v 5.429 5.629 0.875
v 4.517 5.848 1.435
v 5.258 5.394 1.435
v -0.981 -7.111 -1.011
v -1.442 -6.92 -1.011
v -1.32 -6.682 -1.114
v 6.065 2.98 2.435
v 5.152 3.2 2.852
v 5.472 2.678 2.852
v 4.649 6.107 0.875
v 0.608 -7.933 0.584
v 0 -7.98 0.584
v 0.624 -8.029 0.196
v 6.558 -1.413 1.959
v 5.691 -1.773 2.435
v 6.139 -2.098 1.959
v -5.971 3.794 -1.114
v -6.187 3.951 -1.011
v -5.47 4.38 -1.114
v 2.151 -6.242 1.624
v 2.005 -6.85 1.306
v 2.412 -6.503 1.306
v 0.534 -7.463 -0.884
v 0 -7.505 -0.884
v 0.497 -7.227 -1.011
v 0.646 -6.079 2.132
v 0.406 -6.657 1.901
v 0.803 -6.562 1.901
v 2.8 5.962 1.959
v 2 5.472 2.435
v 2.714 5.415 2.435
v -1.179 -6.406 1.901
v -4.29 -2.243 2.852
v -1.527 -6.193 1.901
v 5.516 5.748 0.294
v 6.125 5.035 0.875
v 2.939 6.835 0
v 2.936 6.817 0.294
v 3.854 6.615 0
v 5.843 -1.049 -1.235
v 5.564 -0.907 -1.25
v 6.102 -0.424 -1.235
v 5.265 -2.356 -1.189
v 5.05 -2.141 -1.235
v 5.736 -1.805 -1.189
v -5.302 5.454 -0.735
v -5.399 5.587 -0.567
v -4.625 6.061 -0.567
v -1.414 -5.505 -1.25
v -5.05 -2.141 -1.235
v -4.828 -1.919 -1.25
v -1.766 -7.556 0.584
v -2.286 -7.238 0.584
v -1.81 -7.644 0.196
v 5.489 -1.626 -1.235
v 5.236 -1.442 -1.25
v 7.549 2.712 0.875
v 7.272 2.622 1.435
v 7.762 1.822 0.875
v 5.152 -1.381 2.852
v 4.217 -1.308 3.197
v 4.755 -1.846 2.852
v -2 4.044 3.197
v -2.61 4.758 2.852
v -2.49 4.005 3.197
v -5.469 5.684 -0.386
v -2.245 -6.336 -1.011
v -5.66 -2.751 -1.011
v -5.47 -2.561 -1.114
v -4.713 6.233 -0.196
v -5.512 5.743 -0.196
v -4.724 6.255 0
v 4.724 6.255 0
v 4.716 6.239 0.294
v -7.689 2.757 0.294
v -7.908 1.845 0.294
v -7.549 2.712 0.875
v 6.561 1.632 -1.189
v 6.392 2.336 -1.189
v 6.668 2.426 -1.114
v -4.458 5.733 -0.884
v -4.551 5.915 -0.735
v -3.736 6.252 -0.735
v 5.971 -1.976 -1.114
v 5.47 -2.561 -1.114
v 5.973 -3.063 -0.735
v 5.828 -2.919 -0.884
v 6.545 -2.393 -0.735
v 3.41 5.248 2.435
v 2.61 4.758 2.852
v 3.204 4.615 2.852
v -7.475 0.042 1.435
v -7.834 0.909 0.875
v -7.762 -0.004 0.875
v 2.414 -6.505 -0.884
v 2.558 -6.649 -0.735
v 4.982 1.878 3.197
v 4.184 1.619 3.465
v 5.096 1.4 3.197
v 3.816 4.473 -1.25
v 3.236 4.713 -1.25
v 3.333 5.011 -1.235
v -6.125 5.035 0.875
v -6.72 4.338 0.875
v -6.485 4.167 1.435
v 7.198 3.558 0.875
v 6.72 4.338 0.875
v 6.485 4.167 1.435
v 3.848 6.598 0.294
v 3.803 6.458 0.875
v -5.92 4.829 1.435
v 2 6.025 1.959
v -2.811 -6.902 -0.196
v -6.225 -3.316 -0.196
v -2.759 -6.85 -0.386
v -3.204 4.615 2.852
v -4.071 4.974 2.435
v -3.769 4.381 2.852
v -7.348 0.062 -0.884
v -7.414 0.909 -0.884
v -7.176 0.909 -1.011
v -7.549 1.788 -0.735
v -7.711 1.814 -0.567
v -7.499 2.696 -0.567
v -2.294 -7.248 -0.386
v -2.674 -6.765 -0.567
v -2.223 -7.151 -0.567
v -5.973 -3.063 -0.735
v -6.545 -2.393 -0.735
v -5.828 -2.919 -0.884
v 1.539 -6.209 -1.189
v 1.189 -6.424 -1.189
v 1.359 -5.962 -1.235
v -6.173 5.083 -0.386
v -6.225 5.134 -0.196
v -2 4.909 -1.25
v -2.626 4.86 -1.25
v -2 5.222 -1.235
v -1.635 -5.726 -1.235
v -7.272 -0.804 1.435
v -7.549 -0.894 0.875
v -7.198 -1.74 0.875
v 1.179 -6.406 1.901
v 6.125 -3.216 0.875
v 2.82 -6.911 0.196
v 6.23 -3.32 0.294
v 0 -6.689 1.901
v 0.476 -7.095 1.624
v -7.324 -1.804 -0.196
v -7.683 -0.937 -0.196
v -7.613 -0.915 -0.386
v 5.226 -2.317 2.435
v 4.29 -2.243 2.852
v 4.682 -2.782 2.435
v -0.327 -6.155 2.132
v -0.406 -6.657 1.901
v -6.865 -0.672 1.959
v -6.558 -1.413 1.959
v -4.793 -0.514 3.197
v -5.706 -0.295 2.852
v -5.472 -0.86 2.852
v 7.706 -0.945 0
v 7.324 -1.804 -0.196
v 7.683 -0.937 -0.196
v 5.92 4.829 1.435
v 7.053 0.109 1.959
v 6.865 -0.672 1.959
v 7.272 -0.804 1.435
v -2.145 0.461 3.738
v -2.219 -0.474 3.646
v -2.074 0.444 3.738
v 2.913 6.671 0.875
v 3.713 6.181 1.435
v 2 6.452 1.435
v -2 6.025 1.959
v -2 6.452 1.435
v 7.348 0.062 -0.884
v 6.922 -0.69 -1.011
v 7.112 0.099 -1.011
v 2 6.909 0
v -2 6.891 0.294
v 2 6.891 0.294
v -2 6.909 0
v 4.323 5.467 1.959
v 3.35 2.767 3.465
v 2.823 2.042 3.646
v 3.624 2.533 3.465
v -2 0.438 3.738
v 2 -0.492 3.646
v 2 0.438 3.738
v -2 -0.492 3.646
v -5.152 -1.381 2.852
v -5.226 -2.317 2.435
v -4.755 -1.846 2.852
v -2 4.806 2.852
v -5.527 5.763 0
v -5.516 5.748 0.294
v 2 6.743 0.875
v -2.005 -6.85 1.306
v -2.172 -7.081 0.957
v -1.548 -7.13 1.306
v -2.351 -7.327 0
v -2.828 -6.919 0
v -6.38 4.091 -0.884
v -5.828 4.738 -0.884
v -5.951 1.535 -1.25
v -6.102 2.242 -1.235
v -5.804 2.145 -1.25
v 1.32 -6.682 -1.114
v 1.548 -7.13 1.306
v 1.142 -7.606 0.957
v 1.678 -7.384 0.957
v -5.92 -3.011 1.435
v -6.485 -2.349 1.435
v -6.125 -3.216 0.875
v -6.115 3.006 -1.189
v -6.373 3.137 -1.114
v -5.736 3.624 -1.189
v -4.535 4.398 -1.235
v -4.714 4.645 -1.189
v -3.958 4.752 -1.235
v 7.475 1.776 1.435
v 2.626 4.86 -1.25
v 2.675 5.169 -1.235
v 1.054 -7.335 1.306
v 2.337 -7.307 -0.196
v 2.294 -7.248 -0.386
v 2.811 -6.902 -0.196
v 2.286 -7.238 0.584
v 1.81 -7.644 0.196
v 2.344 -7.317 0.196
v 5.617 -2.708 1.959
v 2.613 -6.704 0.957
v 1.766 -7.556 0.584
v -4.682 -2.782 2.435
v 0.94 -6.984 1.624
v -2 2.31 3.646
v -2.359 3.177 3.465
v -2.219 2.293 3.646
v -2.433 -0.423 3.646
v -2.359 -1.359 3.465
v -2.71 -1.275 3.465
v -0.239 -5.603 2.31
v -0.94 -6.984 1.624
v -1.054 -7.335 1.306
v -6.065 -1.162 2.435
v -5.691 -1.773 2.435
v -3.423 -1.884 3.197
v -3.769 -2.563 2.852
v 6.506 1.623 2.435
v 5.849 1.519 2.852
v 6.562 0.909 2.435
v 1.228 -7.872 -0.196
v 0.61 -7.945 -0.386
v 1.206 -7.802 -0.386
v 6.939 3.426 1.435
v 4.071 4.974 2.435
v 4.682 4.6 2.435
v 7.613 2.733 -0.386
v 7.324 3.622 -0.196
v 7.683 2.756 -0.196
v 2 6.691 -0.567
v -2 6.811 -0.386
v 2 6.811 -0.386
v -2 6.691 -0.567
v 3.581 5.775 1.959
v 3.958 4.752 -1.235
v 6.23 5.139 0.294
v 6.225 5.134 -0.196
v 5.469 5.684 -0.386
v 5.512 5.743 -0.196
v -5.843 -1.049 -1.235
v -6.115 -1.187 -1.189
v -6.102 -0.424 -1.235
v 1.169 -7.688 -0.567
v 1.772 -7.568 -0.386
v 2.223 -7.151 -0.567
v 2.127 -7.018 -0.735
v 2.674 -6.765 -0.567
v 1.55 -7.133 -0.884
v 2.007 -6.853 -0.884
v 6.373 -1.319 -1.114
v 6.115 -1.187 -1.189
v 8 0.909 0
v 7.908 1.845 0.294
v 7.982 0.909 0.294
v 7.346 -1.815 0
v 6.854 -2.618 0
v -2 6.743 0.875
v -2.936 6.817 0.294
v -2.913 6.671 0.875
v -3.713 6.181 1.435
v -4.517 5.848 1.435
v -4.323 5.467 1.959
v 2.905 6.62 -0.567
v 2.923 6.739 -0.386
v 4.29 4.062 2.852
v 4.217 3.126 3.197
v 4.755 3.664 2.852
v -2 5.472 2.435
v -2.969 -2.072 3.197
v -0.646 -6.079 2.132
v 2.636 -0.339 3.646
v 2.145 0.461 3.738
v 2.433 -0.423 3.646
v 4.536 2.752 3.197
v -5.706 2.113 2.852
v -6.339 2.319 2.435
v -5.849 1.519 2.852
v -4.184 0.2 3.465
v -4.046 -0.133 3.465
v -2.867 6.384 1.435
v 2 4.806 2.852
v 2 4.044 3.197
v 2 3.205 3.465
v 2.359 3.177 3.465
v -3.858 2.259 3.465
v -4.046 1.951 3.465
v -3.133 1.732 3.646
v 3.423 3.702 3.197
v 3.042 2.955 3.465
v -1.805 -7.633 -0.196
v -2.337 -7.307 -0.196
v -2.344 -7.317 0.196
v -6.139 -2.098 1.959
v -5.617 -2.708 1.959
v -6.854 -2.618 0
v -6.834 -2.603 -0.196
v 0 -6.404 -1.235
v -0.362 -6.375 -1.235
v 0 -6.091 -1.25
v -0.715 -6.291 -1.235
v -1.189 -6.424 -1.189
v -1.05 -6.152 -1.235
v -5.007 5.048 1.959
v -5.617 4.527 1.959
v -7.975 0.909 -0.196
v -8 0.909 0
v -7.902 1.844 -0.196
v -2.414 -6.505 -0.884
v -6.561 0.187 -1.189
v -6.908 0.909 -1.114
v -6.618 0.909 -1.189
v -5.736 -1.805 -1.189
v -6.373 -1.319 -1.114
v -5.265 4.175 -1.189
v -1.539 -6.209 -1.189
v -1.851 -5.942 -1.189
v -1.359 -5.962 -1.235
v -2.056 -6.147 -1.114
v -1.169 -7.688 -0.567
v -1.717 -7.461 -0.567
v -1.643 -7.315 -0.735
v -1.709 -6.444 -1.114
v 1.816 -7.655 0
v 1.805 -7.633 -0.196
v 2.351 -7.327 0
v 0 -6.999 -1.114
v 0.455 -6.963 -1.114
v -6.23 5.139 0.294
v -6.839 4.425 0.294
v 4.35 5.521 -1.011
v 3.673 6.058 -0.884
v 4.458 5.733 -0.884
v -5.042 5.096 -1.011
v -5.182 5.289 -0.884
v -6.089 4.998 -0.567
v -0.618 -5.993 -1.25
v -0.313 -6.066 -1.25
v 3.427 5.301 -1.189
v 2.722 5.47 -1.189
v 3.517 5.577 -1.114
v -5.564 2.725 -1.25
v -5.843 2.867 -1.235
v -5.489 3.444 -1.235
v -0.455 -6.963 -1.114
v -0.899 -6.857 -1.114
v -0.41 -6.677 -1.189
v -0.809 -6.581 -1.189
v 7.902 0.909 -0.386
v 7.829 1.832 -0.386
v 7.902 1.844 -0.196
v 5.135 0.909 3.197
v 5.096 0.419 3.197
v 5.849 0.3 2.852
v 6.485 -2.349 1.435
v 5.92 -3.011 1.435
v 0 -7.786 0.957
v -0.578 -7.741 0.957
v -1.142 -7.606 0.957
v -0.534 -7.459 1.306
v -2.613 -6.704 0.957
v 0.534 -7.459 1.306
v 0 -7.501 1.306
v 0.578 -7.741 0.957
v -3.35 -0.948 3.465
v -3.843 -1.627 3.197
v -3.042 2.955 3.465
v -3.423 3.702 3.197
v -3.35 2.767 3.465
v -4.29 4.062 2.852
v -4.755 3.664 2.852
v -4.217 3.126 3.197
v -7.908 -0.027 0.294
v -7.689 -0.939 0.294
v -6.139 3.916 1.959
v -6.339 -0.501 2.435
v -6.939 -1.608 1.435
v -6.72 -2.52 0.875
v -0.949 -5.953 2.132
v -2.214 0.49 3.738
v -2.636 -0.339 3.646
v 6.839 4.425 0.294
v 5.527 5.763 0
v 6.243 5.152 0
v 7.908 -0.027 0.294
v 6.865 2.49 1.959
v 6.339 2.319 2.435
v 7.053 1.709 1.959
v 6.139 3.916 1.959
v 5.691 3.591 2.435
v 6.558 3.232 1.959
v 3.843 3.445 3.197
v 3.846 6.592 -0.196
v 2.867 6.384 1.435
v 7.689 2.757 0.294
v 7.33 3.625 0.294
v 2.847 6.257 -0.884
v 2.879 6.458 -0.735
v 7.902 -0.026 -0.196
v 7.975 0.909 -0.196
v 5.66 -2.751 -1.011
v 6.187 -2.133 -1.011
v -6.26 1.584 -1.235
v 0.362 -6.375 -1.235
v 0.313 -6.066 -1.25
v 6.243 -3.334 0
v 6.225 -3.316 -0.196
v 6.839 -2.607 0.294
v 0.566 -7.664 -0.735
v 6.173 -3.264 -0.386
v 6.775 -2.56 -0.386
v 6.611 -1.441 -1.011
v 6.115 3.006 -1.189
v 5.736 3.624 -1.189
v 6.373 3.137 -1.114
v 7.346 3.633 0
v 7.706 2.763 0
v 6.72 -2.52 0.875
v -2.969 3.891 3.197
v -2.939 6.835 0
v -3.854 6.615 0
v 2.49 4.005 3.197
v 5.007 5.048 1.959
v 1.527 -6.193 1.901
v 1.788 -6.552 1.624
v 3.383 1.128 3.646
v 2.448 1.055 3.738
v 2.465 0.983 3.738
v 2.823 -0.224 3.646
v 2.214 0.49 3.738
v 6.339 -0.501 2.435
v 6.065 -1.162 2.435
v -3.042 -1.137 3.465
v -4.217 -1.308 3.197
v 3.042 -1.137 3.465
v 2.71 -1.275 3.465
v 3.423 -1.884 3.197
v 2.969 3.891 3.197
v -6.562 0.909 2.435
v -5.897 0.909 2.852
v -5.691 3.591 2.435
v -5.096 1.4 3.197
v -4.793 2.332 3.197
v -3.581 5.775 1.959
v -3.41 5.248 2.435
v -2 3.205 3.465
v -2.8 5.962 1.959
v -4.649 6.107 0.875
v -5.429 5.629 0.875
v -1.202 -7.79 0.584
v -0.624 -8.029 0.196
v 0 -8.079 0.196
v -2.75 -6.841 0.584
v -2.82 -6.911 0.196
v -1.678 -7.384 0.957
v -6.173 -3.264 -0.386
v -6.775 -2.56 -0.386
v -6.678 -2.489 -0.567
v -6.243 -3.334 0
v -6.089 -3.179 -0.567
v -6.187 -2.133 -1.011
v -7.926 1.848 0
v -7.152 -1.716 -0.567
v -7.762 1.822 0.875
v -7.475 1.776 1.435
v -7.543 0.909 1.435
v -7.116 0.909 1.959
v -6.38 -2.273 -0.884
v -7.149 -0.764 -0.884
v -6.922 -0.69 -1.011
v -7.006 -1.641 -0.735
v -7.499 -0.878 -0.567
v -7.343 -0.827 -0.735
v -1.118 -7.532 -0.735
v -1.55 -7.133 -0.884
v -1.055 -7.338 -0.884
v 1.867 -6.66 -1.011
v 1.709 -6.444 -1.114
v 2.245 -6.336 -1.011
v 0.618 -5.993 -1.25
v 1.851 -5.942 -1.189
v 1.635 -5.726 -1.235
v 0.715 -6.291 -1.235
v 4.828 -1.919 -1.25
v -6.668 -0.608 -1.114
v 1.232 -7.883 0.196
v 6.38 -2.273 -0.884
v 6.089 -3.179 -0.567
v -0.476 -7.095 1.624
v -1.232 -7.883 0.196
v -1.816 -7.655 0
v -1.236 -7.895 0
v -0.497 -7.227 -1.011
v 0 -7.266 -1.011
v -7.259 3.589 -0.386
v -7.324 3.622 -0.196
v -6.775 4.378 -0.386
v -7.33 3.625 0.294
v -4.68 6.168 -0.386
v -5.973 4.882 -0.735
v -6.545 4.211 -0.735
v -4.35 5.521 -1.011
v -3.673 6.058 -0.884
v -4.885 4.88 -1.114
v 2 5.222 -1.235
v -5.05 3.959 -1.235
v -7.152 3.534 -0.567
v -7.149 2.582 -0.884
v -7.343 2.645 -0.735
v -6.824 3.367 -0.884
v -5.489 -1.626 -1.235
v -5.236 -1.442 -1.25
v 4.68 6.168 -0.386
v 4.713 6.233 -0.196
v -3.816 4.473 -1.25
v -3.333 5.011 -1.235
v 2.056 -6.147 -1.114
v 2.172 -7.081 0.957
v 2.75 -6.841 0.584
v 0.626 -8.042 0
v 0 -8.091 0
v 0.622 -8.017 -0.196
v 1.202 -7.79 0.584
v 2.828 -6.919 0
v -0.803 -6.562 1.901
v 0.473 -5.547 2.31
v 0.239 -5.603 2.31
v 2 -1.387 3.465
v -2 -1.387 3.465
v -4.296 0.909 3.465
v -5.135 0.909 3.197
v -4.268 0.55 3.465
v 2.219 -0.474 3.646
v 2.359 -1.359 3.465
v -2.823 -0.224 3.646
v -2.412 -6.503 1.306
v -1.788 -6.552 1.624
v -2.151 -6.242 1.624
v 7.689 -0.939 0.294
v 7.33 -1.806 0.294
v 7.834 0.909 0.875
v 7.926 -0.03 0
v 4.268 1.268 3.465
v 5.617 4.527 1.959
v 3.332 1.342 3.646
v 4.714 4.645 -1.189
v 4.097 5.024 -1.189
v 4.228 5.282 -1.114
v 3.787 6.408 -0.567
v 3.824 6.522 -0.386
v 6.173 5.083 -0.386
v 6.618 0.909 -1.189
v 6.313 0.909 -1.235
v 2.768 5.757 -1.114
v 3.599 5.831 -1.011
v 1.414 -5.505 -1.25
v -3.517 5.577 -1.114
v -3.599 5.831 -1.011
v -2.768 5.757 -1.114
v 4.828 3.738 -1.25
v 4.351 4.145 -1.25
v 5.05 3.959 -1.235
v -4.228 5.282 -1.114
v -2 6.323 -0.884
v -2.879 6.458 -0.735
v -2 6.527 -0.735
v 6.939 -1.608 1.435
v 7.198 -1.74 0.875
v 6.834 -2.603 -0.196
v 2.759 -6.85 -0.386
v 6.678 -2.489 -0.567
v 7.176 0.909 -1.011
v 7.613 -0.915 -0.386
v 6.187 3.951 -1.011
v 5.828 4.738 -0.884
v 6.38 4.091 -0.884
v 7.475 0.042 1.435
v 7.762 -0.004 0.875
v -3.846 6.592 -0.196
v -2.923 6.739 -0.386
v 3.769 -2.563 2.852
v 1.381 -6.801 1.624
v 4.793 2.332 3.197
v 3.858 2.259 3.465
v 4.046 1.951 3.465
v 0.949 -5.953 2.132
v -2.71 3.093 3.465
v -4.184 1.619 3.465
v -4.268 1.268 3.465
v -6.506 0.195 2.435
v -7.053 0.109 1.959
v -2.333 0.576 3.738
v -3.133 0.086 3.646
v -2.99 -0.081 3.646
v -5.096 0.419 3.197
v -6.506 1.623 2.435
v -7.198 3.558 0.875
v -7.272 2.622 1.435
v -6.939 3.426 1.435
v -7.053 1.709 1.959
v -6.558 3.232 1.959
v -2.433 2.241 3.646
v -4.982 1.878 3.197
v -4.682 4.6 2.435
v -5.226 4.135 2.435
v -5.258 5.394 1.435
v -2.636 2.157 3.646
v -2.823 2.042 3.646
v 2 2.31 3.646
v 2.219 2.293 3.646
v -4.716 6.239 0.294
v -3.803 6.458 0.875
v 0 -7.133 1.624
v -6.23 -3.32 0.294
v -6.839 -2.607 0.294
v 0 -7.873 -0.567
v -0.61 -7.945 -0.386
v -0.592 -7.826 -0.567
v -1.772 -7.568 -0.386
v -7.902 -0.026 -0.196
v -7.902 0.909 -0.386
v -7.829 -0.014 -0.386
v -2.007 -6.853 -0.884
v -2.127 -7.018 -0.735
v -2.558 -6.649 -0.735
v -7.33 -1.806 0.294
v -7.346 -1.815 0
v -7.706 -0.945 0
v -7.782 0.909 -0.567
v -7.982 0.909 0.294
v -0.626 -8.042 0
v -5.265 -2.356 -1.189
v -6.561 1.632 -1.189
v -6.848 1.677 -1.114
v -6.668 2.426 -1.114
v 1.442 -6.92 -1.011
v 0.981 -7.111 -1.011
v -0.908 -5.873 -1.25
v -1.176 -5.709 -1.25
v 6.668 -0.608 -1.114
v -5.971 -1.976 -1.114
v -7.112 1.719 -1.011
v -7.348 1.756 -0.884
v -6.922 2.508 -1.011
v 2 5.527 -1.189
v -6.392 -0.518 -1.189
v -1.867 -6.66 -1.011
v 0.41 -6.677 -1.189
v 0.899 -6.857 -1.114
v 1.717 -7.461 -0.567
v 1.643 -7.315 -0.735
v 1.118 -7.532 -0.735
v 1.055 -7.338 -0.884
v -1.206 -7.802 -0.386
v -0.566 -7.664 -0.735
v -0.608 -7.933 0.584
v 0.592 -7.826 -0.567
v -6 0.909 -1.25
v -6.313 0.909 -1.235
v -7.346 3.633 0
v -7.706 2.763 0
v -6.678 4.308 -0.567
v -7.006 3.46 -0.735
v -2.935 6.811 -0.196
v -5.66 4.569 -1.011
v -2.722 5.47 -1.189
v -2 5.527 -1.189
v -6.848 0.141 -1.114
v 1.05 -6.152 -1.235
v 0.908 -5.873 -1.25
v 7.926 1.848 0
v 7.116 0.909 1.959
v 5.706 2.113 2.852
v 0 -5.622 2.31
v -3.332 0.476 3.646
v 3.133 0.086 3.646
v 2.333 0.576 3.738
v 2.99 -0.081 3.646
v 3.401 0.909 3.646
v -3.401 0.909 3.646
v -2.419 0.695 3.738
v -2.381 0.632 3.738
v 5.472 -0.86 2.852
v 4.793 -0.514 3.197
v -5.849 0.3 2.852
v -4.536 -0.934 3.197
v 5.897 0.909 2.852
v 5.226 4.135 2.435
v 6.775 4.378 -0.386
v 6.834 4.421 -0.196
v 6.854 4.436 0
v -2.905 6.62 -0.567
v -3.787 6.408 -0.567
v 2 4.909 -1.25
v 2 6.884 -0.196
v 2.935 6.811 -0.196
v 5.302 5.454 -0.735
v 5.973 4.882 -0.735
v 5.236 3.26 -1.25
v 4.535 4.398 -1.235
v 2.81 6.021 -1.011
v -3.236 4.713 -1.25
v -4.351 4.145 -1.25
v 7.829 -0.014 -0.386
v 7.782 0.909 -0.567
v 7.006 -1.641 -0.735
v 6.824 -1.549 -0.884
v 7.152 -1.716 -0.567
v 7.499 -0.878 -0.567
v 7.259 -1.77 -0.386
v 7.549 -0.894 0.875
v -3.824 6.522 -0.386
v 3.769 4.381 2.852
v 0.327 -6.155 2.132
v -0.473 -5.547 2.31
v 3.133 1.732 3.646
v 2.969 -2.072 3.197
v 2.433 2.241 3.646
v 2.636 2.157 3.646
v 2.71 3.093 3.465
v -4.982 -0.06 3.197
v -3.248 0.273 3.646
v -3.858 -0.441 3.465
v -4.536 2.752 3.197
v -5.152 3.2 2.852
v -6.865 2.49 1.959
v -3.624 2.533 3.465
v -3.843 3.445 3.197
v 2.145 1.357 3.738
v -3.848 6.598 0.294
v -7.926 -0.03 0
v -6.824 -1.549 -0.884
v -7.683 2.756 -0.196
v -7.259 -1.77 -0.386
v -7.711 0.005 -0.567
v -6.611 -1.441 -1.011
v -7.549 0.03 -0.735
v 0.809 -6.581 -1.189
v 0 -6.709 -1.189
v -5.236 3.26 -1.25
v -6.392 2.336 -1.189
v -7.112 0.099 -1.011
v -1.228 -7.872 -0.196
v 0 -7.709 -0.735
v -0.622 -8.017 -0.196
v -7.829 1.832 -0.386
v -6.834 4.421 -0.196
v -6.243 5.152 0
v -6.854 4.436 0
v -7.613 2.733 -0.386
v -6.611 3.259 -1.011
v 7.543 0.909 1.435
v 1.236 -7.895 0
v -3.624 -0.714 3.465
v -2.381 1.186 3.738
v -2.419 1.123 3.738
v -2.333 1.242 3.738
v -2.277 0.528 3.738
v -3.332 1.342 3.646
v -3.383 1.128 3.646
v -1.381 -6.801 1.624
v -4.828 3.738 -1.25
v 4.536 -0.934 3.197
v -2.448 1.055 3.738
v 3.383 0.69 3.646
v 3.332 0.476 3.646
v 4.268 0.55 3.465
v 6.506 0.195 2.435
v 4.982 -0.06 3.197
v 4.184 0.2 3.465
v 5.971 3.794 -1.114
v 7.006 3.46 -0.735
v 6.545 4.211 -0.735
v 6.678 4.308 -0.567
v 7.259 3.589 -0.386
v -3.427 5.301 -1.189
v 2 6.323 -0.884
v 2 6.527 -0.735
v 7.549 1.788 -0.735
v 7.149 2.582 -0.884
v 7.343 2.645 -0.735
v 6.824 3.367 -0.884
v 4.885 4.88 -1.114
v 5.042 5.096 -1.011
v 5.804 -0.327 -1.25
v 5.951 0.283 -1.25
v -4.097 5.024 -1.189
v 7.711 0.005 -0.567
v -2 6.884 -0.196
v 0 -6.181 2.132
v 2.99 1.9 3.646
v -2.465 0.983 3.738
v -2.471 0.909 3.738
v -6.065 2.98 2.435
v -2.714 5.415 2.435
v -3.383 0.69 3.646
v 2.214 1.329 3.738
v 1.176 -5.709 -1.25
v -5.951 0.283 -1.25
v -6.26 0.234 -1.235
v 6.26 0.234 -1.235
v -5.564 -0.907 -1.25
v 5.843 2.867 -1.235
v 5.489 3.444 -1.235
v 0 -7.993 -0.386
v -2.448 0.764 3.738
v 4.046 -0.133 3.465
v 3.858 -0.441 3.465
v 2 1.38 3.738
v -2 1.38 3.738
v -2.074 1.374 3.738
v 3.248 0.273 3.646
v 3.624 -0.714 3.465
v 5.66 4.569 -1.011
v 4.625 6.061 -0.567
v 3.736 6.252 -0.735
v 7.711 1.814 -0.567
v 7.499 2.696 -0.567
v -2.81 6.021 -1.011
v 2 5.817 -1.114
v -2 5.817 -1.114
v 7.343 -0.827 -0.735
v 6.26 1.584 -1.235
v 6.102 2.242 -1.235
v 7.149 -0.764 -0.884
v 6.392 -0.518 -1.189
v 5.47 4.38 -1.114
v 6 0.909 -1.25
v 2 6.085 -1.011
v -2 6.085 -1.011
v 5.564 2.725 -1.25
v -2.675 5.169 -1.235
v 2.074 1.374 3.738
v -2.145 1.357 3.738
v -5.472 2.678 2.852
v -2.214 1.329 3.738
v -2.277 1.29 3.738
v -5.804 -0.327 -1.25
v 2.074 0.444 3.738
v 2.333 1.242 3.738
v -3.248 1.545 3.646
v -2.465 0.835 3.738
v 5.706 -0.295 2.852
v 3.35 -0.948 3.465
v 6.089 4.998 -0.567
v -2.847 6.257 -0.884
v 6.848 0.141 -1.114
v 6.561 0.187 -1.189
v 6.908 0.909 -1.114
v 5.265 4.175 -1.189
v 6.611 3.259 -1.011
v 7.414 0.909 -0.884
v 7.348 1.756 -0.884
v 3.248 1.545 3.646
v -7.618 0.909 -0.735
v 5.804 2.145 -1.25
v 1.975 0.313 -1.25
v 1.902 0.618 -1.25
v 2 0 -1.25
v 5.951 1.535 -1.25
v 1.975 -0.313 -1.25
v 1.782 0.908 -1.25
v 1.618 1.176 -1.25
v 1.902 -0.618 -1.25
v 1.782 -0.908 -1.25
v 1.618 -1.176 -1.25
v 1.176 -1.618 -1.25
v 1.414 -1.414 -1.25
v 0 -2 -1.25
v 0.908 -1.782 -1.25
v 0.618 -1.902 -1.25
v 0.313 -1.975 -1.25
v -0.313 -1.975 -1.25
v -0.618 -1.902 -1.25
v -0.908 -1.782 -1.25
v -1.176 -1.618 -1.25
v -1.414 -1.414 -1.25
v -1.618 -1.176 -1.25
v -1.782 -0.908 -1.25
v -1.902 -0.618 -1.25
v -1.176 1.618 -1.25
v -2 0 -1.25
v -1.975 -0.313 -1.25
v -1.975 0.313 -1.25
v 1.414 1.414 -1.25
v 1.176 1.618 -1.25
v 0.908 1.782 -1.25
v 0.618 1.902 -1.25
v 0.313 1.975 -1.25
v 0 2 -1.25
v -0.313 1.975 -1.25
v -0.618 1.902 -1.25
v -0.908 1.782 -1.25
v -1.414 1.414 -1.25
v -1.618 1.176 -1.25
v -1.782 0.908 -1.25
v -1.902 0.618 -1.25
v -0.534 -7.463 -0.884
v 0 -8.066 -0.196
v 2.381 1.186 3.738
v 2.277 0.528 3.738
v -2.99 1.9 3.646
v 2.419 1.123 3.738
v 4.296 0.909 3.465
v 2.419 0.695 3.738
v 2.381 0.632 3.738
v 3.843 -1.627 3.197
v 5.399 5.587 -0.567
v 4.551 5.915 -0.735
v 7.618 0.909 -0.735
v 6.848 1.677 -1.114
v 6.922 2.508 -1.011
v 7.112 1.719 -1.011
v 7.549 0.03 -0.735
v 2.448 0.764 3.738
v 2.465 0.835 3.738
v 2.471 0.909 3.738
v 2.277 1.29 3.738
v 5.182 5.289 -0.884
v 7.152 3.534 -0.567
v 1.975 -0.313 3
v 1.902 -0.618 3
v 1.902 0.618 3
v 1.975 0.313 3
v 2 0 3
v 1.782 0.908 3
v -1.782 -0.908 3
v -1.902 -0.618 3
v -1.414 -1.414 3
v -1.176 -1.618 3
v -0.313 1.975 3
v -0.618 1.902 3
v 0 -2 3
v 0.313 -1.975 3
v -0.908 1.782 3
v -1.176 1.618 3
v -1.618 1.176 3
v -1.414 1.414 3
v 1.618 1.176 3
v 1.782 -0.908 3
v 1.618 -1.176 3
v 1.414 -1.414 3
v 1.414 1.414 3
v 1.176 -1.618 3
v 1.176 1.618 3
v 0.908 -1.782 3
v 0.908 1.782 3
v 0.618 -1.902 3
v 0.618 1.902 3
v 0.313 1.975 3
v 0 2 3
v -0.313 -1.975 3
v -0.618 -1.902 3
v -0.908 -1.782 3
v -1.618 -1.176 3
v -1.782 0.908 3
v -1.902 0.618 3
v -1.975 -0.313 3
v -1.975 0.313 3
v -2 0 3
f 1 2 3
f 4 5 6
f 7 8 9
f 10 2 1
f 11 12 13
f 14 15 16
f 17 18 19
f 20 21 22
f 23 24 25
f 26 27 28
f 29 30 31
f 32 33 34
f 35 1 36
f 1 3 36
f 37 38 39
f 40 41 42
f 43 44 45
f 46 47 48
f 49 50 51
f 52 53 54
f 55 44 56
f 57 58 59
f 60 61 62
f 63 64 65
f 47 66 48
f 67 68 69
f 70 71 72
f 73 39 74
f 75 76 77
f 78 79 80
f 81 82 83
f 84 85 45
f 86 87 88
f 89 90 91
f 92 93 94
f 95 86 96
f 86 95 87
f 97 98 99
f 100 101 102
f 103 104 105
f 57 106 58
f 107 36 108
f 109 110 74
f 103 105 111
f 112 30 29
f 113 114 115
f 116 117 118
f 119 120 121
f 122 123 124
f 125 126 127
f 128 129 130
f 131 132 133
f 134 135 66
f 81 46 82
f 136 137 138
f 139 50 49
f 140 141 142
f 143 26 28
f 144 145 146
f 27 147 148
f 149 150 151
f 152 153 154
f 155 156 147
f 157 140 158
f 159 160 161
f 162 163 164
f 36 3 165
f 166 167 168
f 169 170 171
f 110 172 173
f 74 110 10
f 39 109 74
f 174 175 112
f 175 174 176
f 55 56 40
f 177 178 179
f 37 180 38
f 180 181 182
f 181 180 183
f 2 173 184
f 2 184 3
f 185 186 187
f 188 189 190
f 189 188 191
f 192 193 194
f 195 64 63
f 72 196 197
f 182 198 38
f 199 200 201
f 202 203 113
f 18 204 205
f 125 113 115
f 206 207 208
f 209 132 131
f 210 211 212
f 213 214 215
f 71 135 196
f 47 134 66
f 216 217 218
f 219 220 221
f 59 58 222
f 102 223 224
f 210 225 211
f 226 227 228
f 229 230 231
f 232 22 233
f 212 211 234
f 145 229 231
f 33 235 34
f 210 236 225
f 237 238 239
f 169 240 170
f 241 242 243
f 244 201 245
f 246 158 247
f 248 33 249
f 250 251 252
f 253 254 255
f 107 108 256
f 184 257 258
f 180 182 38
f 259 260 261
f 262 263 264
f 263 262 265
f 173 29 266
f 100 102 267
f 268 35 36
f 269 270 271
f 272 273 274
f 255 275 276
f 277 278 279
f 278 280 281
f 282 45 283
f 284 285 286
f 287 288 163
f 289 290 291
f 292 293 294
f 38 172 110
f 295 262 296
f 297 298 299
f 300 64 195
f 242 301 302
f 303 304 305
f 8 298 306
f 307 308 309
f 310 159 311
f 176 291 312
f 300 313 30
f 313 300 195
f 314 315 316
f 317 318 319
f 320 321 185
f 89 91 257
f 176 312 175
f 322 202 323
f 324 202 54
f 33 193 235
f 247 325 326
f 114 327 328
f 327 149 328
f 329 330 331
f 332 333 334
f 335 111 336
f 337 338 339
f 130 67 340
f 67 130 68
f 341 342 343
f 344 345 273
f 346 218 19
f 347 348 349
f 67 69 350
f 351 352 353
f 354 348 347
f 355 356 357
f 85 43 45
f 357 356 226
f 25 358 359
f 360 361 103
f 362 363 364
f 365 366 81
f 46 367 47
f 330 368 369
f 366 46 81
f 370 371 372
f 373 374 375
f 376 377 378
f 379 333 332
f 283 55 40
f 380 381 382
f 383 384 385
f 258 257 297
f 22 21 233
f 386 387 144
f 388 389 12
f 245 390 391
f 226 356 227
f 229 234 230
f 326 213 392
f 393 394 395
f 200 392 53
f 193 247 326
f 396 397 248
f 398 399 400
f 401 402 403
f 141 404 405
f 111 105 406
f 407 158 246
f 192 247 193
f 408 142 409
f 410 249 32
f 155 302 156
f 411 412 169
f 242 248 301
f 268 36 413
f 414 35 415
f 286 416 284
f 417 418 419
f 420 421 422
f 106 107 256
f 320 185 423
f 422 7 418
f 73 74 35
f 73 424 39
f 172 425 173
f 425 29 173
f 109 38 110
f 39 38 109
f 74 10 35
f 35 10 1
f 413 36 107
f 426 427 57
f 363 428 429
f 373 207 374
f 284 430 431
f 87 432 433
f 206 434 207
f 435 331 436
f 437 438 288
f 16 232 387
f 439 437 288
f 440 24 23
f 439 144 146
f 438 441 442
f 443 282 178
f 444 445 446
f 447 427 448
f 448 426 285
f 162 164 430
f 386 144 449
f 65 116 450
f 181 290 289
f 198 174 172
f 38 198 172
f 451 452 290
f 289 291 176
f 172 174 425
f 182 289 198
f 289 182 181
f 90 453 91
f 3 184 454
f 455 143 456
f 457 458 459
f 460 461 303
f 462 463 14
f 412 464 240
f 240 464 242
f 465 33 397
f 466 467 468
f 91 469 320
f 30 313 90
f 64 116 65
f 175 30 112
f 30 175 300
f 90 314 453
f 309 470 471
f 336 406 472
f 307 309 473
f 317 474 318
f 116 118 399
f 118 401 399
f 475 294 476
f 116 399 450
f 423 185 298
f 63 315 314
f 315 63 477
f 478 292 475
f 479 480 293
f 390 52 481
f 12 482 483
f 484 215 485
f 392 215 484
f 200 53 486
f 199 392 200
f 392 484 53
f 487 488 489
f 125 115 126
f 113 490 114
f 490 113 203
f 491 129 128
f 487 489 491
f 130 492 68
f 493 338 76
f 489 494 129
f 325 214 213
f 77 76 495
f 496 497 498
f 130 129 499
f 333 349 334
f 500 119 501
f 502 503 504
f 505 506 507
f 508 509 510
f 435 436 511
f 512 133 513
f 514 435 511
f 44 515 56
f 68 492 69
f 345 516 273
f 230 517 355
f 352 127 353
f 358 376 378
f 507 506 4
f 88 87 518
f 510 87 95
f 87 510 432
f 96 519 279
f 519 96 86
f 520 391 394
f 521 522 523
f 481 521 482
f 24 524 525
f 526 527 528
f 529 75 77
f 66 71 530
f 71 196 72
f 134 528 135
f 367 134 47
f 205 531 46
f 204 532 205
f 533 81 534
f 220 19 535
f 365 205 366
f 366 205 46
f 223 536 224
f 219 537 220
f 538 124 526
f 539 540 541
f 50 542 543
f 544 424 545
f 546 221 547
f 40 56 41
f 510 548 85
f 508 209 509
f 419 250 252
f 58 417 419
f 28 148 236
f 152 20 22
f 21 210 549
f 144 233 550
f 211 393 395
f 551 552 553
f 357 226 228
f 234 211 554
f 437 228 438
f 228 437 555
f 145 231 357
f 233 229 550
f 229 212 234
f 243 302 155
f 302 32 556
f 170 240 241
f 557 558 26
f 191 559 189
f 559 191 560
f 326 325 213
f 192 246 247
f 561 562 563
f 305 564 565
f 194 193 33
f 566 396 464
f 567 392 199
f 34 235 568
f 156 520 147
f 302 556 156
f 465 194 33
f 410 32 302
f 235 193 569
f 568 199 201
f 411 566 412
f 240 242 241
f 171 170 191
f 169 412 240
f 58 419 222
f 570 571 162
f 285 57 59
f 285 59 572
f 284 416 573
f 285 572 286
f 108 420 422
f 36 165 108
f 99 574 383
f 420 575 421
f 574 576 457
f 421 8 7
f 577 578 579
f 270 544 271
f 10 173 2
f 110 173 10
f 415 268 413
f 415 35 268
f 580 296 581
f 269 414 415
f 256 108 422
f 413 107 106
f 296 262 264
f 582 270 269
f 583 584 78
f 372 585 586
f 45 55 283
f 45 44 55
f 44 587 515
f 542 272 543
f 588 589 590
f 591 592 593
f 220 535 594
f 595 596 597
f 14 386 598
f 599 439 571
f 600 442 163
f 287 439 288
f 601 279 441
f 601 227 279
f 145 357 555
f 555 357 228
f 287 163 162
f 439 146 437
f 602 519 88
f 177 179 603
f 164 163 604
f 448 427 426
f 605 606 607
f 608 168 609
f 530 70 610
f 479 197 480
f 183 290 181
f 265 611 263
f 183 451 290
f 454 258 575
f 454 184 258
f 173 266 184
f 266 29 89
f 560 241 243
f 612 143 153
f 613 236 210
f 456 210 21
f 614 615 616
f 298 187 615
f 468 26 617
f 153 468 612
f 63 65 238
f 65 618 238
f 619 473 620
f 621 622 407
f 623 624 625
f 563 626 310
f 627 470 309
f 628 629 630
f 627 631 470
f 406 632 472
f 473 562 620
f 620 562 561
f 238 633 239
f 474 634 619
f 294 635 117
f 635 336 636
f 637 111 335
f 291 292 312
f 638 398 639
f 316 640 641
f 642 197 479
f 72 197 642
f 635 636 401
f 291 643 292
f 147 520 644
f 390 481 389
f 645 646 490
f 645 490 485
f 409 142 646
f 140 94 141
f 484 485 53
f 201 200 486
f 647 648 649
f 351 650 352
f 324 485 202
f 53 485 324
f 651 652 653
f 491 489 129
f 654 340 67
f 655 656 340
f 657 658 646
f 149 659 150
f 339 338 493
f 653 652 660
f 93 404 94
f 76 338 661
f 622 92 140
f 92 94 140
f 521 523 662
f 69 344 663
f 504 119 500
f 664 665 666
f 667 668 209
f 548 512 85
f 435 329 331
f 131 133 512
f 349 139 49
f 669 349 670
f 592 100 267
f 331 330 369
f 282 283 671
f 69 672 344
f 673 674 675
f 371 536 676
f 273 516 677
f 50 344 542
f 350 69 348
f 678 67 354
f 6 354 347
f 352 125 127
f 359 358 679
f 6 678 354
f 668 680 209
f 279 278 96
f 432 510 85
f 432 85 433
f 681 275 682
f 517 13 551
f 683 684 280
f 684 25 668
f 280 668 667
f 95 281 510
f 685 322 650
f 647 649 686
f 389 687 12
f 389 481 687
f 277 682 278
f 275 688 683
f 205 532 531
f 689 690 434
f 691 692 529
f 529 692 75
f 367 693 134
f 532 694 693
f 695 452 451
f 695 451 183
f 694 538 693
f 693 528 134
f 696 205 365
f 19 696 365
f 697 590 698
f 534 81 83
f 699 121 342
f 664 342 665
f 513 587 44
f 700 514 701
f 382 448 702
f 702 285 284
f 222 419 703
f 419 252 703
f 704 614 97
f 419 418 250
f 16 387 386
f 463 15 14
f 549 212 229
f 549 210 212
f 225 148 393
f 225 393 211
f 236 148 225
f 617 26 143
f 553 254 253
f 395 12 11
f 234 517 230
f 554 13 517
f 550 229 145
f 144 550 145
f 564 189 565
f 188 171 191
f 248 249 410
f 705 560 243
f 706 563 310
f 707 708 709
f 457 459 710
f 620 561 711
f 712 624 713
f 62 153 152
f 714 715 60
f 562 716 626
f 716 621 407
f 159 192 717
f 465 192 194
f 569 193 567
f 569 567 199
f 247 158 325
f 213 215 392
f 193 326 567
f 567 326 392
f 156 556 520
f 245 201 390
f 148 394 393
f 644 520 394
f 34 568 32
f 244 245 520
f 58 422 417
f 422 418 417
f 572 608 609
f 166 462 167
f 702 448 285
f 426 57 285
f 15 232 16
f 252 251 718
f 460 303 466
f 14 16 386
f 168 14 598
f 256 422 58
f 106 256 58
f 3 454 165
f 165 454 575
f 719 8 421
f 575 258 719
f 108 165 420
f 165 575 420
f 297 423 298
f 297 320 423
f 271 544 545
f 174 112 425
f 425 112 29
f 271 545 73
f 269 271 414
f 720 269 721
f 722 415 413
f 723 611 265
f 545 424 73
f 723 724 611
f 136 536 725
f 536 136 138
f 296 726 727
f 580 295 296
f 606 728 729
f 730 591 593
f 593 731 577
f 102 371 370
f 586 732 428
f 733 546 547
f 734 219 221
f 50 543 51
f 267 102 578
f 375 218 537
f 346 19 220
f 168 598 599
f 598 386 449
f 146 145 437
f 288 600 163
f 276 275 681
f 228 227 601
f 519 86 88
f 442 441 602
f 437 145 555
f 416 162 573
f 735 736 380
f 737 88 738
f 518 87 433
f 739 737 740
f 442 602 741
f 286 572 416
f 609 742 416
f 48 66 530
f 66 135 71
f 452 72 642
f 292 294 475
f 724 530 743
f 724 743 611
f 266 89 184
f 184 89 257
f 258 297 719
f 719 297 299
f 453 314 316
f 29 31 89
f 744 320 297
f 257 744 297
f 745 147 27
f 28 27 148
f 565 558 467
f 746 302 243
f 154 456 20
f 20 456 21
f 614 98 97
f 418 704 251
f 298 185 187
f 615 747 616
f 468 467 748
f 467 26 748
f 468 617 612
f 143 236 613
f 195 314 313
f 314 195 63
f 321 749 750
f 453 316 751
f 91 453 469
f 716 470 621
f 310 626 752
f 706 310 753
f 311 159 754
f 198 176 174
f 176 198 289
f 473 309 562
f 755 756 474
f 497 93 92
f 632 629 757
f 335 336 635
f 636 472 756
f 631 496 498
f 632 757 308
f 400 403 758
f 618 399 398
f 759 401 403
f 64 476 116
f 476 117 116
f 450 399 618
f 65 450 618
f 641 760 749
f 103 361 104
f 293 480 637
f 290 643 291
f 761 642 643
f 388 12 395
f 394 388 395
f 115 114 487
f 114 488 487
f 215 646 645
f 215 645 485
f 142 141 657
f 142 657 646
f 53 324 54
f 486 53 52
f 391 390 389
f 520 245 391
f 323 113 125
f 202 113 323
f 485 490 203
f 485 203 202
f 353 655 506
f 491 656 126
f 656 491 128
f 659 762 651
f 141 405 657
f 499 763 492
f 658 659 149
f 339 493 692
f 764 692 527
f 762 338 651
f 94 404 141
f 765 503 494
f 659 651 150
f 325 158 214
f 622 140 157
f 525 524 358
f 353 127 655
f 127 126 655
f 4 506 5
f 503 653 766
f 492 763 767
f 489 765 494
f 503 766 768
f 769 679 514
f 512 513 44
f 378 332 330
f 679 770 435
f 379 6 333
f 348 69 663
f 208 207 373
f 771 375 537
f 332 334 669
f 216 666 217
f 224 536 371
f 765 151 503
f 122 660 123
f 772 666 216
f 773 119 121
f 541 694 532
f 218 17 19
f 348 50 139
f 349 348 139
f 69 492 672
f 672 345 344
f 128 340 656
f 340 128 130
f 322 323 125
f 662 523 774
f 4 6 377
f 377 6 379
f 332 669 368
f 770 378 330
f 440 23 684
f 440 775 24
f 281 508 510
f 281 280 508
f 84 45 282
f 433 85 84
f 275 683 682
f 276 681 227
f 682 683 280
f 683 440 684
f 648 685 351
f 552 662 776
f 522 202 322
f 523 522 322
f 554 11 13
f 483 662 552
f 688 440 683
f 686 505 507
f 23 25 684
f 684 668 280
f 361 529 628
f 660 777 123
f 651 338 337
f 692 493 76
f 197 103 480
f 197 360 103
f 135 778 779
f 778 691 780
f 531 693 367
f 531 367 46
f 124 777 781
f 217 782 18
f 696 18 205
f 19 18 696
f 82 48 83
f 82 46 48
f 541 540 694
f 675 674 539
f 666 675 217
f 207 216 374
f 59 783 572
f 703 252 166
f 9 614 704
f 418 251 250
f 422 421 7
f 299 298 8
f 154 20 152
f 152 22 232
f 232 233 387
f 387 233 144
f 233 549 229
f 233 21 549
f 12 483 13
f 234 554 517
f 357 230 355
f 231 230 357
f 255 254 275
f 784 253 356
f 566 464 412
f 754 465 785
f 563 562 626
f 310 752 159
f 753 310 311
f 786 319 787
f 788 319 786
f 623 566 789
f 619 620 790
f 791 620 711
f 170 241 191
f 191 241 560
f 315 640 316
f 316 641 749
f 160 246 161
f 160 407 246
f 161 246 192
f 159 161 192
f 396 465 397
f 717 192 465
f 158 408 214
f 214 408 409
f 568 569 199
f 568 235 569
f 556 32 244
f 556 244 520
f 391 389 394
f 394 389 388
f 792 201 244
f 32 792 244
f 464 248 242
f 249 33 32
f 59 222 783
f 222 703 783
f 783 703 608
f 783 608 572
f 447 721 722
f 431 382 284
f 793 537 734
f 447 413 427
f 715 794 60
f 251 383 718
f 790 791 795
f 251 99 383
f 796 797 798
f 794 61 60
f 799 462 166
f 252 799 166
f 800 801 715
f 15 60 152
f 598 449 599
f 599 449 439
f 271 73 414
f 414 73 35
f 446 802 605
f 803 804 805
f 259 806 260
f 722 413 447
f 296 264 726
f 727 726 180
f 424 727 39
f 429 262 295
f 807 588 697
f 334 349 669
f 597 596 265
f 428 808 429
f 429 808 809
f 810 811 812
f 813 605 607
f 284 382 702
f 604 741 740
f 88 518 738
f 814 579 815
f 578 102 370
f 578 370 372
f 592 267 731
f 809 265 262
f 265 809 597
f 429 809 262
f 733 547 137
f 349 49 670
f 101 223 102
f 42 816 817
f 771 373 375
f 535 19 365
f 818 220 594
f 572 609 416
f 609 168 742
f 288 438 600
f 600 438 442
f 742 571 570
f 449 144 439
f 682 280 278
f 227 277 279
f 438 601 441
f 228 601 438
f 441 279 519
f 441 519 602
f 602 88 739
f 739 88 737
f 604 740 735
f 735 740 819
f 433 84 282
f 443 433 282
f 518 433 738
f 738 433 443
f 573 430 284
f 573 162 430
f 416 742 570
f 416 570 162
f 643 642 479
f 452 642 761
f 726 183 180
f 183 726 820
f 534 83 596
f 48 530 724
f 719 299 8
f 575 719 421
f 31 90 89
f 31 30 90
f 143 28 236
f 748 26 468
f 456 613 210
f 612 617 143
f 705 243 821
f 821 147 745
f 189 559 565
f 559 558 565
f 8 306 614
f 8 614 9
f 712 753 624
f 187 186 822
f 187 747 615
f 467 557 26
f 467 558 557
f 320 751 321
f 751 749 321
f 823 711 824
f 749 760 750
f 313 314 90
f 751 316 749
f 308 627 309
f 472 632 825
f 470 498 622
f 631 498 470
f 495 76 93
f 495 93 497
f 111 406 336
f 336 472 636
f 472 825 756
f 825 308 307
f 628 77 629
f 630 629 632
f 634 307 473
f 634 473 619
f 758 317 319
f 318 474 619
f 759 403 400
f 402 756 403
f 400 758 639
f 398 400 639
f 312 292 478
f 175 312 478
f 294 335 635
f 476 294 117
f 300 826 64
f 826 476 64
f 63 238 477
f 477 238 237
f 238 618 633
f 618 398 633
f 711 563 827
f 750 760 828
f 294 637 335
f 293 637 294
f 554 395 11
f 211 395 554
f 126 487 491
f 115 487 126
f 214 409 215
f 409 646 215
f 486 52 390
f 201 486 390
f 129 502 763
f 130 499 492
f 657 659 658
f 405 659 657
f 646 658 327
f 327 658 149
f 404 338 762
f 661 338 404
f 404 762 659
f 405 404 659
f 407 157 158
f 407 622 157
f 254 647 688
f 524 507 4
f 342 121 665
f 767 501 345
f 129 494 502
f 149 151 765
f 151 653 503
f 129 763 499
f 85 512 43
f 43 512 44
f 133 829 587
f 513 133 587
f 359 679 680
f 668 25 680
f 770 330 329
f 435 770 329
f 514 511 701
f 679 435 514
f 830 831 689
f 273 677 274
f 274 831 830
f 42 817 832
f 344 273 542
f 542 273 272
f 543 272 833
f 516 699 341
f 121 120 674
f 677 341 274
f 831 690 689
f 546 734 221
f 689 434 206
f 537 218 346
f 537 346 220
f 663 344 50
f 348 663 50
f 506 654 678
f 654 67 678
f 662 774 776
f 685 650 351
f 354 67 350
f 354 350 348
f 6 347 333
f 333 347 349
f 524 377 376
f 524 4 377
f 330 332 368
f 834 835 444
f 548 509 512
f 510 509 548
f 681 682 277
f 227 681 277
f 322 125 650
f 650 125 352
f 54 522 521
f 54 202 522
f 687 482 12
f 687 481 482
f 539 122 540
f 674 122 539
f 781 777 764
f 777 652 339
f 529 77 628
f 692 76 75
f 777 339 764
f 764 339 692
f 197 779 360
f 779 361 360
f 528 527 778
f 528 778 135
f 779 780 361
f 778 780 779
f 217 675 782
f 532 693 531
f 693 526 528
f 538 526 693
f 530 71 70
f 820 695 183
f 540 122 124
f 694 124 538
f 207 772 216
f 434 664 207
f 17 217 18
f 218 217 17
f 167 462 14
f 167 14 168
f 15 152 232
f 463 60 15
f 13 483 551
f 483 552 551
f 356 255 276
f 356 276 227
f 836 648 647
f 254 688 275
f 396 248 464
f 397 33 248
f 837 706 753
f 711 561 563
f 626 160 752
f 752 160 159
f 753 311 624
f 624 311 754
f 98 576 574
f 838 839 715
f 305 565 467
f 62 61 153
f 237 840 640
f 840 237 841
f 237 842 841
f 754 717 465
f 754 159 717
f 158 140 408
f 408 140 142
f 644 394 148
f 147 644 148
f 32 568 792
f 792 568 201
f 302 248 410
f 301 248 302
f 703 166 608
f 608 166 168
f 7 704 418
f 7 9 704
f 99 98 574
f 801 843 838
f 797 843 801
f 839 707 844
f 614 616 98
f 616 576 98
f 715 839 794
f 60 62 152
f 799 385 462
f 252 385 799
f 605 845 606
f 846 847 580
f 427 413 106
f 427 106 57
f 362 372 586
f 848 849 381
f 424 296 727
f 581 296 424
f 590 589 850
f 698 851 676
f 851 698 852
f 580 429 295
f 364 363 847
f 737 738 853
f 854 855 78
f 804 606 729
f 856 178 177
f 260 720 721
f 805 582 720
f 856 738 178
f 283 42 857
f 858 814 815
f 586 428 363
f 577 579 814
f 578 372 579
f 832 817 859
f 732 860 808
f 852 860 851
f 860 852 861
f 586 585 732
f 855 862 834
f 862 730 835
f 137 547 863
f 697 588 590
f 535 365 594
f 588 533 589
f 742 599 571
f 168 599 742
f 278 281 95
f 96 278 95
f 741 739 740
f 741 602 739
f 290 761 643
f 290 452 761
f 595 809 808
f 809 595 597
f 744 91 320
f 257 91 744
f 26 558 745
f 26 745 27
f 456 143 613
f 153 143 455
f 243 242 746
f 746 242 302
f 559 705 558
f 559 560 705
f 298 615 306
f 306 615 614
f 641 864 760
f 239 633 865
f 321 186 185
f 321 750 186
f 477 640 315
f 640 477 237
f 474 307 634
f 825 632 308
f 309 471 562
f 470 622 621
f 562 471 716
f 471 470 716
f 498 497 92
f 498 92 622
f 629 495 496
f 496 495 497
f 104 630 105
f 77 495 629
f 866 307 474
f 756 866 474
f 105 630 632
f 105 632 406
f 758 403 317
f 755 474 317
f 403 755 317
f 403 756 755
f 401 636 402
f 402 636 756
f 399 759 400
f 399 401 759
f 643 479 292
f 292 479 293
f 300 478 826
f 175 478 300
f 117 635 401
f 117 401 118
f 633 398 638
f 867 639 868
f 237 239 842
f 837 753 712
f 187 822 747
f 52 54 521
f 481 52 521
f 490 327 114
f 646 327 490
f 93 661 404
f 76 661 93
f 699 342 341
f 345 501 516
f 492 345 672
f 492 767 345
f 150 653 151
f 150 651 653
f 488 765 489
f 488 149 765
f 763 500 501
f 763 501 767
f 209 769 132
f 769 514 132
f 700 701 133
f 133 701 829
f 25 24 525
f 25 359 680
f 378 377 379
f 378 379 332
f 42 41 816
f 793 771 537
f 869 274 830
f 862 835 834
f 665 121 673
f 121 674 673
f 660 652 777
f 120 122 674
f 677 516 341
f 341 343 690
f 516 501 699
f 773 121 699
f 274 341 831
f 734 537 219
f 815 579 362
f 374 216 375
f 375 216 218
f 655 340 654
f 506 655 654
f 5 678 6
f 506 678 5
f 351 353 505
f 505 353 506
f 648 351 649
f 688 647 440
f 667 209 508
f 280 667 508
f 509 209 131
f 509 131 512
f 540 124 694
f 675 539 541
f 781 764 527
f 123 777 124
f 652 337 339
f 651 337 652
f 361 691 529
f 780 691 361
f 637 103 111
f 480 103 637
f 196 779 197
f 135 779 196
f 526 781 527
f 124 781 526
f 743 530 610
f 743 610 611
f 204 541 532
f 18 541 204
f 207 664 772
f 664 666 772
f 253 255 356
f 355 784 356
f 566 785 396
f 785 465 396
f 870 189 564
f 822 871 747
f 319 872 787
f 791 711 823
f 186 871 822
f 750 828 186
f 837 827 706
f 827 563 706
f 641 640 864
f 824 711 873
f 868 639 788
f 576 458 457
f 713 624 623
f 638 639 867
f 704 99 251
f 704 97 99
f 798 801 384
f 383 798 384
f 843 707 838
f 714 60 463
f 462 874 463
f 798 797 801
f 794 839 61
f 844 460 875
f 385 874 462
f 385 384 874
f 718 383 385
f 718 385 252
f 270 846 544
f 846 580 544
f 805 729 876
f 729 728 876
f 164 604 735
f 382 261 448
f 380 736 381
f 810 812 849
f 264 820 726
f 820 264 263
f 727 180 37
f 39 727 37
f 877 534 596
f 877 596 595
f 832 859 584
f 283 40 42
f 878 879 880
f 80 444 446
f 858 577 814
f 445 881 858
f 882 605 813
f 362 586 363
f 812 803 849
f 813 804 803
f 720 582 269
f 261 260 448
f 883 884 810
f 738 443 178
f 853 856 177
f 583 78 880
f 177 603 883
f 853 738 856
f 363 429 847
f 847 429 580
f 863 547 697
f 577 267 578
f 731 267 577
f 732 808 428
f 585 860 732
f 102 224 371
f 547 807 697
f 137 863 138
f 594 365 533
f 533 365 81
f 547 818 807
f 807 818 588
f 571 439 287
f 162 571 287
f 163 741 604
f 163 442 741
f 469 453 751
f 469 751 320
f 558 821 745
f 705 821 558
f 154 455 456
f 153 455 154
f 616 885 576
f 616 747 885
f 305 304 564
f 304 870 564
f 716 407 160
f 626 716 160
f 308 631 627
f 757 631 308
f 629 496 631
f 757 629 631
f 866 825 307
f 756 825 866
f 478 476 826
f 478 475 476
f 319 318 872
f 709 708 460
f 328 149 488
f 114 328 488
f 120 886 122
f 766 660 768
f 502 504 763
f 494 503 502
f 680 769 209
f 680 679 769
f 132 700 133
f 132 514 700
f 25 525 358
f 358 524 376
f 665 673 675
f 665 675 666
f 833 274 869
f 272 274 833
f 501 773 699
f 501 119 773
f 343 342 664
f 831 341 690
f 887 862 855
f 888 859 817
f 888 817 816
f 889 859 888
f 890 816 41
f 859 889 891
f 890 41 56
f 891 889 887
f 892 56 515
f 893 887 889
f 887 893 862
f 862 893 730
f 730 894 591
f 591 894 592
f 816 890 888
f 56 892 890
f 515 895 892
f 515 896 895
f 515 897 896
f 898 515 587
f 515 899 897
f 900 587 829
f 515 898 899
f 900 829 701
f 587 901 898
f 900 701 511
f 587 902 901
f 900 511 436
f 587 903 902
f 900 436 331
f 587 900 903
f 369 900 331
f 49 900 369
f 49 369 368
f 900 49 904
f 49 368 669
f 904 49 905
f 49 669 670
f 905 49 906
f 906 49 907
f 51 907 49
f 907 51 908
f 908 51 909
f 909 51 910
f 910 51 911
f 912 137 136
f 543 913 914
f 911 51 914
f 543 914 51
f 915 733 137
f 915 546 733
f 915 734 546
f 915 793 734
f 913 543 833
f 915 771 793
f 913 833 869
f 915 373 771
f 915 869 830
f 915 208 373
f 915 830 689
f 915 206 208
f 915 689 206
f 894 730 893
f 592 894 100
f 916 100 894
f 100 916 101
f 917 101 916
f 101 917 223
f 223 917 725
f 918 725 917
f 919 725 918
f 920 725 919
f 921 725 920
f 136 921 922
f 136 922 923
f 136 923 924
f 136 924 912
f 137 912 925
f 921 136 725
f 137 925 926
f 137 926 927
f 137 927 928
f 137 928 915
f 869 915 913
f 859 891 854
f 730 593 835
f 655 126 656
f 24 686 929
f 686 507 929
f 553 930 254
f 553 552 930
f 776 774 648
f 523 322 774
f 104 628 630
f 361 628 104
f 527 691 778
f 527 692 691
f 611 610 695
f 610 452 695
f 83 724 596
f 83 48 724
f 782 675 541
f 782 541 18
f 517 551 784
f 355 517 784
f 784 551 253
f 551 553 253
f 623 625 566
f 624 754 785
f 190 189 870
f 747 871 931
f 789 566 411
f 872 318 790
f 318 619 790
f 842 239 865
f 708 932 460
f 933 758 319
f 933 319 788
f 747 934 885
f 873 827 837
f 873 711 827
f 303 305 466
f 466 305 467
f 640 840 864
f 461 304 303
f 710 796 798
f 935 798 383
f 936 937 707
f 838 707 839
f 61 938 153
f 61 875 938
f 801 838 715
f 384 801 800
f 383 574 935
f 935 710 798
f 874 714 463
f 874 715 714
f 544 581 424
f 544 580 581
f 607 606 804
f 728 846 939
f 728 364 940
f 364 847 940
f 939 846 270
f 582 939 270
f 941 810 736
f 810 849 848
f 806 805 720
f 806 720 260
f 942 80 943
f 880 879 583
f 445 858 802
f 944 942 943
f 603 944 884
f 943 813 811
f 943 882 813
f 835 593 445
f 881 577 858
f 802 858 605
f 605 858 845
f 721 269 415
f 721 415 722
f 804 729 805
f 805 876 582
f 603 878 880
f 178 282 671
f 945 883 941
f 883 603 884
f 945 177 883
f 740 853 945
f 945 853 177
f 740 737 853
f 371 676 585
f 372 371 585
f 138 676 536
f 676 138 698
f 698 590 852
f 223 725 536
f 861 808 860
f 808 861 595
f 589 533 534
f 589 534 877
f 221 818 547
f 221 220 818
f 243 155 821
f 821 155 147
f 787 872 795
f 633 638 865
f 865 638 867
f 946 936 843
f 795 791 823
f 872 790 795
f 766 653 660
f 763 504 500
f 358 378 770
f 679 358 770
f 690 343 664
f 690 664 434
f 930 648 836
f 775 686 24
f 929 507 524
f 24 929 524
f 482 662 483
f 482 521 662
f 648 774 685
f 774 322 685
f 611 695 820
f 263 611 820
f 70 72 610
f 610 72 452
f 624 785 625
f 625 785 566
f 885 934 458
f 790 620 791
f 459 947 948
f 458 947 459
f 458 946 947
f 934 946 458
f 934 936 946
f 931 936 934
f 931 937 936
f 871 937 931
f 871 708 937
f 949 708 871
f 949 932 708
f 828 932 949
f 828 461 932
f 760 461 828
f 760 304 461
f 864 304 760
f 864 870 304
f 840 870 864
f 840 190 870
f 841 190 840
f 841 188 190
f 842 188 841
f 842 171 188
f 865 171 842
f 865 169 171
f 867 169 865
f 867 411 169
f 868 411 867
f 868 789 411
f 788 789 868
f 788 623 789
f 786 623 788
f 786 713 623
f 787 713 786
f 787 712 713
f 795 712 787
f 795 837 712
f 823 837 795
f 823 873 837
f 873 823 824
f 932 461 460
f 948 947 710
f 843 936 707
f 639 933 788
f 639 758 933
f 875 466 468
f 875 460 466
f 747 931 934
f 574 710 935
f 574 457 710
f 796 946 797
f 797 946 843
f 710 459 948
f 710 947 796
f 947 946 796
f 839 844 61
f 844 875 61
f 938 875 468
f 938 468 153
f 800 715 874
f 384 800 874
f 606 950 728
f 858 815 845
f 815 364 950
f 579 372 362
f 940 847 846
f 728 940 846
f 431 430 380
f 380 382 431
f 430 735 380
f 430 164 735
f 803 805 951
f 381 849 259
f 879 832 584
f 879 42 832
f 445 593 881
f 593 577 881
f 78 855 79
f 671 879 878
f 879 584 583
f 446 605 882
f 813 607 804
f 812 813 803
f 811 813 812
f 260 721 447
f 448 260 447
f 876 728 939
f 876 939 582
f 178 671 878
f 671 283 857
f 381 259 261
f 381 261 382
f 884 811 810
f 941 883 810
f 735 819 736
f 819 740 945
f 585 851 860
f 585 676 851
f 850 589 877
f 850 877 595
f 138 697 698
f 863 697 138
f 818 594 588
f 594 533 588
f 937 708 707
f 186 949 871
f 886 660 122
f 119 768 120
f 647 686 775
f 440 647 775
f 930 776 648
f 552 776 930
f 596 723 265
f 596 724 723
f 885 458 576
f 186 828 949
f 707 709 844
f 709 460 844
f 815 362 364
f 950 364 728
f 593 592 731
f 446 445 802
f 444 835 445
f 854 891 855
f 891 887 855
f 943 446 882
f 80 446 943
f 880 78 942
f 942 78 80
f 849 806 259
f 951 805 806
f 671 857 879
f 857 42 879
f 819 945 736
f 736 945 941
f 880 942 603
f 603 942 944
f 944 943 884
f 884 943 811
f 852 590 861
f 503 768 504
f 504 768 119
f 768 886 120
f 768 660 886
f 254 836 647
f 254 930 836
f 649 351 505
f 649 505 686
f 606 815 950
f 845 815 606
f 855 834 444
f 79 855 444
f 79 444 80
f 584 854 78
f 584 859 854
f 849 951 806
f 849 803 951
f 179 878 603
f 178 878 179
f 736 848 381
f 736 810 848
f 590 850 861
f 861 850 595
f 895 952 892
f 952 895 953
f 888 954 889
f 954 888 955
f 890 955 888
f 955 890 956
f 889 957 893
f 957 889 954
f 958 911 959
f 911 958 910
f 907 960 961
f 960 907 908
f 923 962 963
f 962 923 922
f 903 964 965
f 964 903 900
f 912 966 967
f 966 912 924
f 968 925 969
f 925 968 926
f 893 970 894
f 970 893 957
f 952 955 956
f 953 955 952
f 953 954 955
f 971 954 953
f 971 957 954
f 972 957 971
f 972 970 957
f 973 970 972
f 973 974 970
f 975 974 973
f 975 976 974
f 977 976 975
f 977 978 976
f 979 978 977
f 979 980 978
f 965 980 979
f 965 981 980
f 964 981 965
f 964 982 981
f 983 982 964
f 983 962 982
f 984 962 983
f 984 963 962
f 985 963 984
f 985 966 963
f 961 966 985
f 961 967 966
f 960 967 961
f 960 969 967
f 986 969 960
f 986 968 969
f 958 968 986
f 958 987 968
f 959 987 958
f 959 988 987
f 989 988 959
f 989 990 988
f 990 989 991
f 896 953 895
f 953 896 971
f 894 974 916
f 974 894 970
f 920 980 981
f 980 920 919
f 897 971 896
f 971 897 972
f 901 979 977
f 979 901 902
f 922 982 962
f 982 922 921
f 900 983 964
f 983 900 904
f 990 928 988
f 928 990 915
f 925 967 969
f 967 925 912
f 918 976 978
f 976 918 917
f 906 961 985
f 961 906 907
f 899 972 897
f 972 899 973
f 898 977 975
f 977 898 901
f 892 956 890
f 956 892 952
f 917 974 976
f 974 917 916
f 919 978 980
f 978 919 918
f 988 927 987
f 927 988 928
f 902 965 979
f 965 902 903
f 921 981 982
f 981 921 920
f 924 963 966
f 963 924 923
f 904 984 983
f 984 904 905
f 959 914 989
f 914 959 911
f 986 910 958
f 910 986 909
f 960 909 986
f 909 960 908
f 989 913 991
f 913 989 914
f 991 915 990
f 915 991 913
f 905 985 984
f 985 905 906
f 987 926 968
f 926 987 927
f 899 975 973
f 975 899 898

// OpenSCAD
use <MCAD/regular_shapes.scad>

module hemisphere(r=1){
    intersection(){
        sphere(r);
        translate([0, 0, r/2])
        cube([2*r, 2*r, r], center=true);
    }
}

module smooth_hemi(r=1, smooth_r=0.1){
    hull(){
        hemisphere(r);
        torus2(r-smooth_r, smooth_r);
    }
}

module eye(r=8, h=5, stem_l=8, stem_r=2, smooth_r=2, $fn=40){
    difference(){
        scale([1, 1, h/(r+smooth_r)]){
            smooth_hemi(r, smooth_r);
        }
        translate([0, 0, -smooth_r])
        cylinder(h, stem_r, stem_r);
    }
}

module stop(stem_r=1.5, stem_l=8, t=1, m=3){
    cylinder(1.5, stem_r*m, stem_r*m);
    cylinder(stem_l, stem_r, stem_r);
}

module nose(
    r_top=6,
    r_bottom=4,
    width=16,
    height=15,
    h=5,
    stem_l=8,
    stem_r=1.5,
    smooth_r=2,
    $fn=40
){
    y_translate = (height - r_top - r_bottom);
    top_weight = r_top * r_top * 2 / (r_top * r_top * 2 + r_bottom * r_bottom);
    difference(){
        scale([1, 1, h/(r_top+smooth_r)]){
            hull(){
                translate([width/2 - r_top, y_translate * (1 - top_weight)])
                smooth_hemi(r_top, smooth_r);
                translate([-width/2 + r_top, y_translate * (1 - top_weight)])
                smooth_hemi(r_top, smooth_r);
                translate([0, -y_translate * (top_weight)])
                smooth_hemi(r_bottom, smooth_r);
            }
        }

        translate([0, 0, -smooth_r])
        cylinder(h, stem_r, stem_r);
    }
}


//translate([12, 0, 0])
//eye(h=8, r=11, stem_r=2);
//stop(stem_r=1.9, $fn=30);


//translate([-24, 0, 0])
nose(stem_r=2);
